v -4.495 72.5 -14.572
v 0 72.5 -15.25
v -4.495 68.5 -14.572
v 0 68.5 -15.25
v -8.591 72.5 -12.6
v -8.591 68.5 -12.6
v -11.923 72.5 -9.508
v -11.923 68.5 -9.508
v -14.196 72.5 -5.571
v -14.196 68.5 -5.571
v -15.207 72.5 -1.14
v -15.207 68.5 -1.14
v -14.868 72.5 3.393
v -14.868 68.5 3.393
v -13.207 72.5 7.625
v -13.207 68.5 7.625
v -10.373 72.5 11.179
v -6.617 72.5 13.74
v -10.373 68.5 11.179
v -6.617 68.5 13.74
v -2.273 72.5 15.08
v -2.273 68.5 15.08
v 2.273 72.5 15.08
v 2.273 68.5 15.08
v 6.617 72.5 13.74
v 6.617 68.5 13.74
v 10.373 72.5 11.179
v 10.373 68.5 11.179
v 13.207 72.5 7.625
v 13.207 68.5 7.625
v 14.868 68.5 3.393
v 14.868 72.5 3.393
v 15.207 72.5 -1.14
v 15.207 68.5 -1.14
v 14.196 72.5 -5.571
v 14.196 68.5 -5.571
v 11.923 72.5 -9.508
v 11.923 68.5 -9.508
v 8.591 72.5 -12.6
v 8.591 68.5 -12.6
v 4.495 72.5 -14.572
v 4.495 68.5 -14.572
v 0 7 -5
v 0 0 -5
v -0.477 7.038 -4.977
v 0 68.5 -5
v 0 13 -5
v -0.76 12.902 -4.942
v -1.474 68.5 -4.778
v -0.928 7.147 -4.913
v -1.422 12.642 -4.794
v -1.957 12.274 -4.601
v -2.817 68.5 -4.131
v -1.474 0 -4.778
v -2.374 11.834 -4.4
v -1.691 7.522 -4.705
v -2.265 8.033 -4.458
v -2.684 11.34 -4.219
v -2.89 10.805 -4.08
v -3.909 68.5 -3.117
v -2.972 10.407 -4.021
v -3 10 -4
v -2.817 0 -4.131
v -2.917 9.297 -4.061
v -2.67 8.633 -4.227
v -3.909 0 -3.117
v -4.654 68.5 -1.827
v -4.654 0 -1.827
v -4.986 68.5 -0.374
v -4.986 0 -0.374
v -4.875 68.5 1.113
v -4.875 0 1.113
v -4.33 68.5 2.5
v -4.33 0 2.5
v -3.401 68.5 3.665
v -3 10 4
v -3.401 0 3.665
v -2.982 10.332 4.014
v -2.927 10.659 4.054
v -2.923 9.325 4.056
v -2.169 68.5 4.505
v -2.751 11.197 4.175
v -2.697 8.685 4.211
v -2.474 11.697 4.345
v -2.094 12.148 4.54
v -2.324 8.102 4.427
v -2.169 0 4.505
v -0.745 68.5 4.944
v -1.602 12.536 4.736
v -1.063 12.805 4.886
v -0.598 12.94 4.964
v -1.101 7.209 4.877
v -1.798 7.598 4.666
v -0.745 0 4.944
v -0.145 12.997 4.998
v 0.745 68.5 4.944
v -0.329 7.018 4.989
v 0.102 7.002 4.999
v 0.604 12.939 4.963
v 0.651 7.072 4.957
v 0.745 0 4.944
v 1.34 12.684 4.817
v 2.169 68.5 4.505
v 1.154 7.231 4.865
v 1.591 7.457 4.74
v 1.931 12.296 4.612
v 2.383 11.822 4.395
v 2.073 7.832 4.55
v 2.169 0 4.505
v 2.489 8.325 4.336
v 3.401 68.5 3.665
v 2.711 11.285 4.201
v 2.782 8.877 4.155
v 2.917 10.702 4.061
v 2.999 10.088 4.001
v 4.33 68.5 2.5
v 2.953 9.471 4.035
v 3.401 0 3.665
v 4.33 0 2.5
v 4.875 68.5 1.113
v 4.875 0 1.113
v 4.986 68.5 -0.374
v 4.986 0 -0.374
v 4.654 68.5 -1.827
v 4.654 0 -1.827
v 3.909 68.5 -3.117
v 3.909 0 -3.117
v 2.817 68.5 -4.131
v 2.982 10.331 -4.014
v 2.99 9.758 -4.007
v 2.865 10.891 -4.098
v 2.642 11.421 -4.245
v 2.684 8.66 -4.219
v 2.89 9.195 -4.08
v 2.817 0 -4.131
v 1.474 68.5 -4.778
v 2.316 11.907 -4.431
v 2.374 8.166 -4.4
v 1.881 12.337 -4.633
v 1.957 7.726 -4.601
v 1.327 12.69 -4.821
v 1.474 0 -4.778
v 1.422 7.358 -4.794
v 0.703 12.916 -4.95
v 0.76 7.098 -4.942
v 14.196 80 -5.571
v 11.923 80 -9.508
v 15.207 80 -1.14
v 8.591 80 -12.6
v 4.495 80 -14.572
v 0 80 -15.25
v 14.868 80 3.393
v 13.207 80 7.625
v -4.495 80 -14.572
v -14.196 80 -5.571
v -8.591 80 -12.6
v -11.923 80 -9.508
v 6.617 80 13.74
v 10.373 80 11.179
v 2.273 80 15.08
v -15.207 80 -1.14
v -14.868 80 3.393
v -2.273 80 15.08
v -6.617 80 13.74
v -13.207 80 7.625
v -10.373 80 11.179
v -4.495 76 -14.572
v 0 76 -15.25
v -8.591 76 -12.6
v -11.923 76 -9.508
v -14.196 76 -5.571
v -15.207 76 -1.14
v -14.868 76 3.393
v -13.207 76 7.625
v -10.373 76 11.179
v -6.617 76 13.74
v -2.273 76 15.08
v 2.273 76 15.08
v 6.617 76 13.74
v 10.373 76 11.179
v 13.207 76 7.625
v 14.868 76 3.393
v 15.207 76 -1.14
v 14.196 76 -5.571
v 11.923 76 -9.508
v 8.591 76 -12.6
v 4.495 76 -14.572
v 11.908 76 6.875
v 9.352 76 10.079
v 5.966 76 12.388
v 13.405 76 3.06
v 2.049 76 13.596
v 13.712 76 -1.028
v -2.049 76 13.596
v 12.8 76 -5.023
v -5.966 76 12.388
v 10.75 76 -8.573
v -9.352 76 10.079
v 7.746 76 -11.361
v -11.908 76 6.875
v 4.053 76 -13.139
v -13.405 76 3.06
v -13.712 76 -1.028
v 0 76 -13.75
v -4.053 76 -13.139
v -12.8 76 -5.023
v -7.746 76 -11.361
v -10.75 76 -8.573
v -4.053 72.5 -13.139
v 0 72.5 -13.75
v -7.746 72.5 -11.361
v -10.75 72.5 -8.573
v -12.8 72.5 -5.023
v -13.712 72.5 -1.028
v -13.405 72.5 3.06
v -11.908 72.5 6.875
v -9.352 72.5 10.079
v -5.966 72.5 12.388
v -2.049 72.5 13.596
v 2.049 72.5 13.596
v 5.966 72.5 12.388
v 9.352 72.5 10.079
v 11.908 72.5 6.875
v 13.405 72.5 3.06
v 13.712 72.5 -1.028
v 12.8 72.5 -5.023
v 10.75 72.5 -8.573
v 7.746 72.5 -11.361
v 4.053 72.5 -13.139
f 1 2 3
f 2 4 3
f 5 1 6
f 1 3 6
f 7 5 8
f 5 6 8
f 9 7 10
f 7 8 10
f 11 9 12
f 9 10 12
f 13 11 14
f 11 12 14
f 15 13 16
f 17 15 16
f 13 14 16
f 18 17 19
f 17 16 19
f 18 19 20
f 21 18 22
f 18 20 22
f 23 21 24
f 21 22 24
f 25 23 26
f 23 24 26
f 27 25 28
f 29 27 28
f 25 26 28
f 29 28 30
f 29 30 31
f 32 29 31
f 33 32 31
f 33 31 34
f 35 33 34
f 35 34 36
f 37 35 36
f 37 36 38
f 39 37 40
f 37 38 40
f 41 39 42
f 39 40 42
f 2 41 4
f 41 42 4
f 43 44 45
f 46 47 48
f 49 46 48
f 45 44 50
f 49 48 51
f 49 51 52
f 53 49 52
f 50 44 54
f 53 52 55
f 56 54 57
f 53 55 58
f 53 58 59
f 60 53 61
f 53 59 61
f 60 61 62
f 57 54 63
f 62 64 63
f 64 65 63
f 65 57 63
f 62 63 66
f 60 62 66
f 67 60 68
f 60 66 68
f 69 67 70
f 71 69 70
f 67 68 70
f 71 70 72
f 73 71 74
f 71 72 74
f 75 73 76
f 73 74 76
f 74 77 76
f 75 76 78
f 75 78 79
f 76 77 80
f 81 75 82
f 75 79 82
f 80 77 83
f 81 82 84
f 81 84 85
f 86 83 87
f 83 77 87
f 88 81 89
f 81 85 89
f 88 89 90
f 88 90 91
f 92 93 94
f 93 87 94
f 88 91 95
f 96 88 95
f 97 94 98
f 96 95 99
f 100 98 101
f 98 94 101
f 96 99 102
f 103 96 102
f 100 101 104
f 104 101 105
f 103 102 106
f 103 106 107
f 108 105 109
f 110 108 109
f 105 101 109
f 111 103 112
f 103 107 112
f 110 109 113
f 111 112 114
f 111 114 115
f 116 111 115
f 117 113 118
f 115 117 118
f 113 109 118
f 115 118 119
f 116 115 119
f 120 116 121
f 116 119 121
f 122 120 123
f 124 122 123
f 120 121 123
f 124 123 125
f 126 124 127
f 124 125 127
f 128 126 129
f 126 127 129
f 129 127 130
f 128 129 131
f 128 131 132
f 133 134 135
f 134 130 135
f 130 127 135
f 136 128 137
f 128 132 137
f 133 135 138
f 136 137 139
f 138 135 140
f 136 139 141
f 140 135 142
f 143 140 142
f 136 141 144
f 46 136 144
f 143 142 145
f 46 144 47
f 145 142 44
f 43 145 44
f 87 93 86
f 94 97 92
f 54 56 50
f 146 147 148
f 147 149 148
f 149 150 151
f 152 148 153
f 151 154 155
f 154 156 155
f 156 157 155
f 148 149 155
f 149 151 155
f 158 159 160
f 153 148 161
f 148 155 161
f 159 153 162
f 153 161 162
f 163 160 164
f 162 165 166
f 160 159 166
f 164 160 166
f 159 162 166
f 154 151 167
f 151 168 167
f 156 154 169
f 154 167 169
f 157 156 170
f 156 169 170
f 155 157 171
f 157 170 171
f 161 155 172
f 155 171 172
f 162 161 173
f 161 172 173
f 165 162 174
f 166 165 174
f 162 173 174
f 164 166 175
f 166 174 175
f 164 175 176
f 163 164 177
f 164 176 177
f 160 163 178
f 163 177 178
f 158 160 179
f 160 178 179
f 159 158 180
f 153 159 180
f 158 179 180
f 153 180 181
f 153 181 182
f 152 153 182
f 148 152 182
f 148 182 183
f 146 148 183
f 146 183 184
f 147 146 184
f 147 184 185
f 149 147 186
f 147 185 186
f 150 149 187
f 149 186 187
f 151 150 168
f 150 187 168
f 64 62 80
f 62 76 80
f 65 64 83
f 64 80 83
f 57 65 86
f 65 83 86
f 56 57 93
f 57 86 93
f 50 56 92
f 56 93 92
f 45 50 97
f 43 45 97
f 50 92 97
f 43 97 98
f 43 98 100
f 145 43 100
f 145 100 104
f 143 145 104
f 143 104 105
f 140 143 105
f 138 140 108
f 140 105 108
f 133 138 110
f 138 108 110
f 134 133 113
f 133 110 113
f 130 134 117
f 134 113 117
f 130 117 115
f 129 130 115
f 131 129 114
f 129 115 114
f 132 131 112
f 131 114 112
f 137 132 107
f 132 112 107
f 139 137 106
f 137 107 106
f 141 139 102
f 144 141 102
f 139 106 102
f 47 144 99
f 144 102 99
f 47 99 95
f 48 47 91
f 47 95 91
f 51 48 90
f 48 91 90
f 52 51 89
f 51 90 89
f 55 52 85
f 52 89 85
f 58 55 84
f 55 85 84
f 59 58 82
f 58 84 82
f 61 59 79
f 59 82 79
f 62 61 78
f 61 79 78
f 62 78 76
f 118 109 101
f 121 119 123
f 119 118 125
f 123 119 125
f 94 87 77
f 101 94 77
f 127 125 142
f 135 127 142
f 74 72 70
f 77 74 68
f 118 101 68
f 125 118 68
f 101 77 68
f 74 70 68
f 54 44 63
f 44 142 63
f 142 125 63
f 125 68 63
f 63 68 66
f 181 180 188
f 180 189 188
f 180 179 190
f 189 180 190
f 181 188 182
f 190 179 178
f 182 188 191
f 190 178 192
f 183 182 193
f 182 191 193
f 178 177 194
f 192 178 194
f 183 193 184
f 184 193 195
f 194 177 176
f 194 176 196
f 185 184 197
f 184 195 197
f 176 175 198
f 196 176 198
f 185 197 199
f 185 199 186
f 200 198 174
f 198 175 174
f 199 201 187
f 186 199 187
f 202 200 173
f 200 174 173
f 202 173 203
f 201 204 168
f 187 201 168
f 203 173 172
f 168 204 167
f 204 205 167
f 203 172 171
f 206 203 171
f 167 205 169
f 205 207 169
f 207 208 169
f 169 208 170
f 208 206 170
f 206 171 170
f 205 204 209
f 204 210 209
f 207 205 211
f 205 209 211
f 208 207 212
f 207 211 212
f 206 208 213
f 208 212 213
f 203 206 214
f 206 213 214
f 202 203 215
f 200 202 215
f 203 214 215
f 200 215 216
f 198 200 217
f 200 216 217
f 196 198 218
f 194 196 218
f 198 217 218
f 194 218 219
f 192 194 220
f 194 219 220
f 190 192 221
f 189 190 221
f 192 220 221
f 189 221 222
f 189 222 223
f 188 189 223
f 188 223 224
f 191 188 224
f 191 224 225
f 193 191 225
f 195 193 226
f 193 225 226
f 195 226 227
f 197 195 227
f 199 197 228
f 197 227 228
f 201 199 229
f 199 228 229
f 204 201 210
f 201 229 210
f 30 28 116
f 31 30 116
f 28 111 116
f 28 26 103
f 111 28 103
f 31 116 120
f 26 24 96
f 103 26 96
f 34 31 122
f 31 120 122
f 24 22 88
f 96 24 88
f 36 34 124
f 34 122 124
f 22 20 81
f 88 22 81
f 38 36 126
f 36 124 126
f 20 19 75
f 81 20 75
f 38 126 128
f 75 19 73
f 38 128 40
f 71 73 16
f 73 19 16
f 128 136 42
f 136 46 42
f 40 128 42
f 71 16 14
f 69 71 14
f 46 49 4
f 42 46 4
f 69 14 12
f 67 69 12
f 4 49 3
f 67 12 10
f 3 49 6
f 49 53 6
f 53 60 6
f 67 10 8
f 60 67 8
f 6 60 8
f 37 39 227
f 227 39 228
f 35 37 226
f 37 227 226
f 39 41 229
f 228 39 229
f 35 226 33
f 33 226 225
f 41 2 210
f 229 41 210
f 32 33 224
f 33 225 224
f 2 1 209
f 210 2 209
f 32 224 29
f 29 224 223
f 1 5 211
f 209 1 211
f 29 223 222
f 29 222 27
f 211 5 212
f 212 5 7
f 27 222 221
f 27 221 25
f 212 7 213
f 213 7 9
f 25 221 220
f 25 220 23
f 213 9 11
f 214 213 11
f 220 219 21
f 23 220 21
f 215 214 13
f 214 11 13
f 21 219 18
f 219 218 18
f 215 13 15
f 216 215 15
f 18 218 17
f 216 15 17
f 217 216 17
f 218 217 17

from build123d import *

# Parameters (mm, degrees)
CUT_EXTRUDE1_REACH                  = 84.856
CUT_EXTRUDE1_END_RADIUS             = 5
SKETCH3_R                           = 3
CUT_EXTRUDE1_DIRECTION_2_REACH      = 84.856
CUT_EXTRUDE1_DIRECTION_2_END_RADIUS = 5


with BuildPart() as part:
    # Sketch1 → Revolve2 (revolve)
    with BuildSketch(Plane.XY, mode=Mode.PRIVATE) as revolve2_sk:
        Polygon((0, 0), (0, 80), (15.25, 80), (15.25, 76), (13.75, 76), (13.75, 72.5), (15.25, 72.5), (15.25, 68.5), (5, 68.5), (5, 0), align=None)
    revolve(revolve2_sk.sketch.rotate(Axis((0, 0, 0), (0, 1, 0)), 90), axis=Axis((0, 0, 0), (0, 1, 0)))

    # Cut-Extrude1: up to this cylinder (the profile starts inside it)
    cut_extrude1_end = Plane(origin=(0, 10, 0), z_dir=(0, -1, 0)) * Cylinder(CUT_EXTRUDE1_END_RADIUS, 180.712, mode=Mode.PRIVATE)
    # Sketch3 → Cut-Extrude1 (cut, up to the surface)
    with BuildSketch(Plane.XY, mode=Mode.PRIVATE) as cut_extrude1_sk1:
        with Locations(Location((0, 10, 0), (0, 0, 180))):
            Circle(SKETCH3_R)
    cut_extrude1_tool1 = extrude(cut_extrude1_sk1.sketch, amount=-CUT_EXTRUDE1_REACH, mode=Mode.PRIVATE) & cut_extrude1_end
    add(cut_extrude1_tool1.solids().sort_by_distance((0, 10, 0))[0], mode=Mode.SUBTRACT)

    # Cut-Extrude1 direction 2: up to this cylinder (the profile starts inside it)
    cut_extrude1_direction_2_end = Plane(origin=(0, 10, 0), z_dir=(0, -1, 0)) * Cylinder(CUT_EXTRUDE1_DIRECTION_2_END_RADIUS, 180.712, mode=Mode.PRIVATE)
    # Sketch3 → Cut-Extrude1 direction 2 (cut, up to the surface)
    with BuildSketch(Plane.XY, mode=Mode.PRIVATE) as cut_extrude1_direction_2_sk1:
        with Locations(Location((0, 10, 0), (0, 0, 180))):
            Circle(SKETCH3_R)
    cut_extrude1_direction_2_tool1 = extrude(cut_extrude1_direction_2_sk1.sketch, amount=CUT_EXTRUDE1_DIRECTION_2_REACH, mode=Mode.PRIVATE) & cut_extrude1_direction_2_end
    add(cut_extrude1_direction_2_tool1.solids().sort_by_distance((0, 10, 0))[0], mode=Mode.SUBTRACT)


solid = part.part
